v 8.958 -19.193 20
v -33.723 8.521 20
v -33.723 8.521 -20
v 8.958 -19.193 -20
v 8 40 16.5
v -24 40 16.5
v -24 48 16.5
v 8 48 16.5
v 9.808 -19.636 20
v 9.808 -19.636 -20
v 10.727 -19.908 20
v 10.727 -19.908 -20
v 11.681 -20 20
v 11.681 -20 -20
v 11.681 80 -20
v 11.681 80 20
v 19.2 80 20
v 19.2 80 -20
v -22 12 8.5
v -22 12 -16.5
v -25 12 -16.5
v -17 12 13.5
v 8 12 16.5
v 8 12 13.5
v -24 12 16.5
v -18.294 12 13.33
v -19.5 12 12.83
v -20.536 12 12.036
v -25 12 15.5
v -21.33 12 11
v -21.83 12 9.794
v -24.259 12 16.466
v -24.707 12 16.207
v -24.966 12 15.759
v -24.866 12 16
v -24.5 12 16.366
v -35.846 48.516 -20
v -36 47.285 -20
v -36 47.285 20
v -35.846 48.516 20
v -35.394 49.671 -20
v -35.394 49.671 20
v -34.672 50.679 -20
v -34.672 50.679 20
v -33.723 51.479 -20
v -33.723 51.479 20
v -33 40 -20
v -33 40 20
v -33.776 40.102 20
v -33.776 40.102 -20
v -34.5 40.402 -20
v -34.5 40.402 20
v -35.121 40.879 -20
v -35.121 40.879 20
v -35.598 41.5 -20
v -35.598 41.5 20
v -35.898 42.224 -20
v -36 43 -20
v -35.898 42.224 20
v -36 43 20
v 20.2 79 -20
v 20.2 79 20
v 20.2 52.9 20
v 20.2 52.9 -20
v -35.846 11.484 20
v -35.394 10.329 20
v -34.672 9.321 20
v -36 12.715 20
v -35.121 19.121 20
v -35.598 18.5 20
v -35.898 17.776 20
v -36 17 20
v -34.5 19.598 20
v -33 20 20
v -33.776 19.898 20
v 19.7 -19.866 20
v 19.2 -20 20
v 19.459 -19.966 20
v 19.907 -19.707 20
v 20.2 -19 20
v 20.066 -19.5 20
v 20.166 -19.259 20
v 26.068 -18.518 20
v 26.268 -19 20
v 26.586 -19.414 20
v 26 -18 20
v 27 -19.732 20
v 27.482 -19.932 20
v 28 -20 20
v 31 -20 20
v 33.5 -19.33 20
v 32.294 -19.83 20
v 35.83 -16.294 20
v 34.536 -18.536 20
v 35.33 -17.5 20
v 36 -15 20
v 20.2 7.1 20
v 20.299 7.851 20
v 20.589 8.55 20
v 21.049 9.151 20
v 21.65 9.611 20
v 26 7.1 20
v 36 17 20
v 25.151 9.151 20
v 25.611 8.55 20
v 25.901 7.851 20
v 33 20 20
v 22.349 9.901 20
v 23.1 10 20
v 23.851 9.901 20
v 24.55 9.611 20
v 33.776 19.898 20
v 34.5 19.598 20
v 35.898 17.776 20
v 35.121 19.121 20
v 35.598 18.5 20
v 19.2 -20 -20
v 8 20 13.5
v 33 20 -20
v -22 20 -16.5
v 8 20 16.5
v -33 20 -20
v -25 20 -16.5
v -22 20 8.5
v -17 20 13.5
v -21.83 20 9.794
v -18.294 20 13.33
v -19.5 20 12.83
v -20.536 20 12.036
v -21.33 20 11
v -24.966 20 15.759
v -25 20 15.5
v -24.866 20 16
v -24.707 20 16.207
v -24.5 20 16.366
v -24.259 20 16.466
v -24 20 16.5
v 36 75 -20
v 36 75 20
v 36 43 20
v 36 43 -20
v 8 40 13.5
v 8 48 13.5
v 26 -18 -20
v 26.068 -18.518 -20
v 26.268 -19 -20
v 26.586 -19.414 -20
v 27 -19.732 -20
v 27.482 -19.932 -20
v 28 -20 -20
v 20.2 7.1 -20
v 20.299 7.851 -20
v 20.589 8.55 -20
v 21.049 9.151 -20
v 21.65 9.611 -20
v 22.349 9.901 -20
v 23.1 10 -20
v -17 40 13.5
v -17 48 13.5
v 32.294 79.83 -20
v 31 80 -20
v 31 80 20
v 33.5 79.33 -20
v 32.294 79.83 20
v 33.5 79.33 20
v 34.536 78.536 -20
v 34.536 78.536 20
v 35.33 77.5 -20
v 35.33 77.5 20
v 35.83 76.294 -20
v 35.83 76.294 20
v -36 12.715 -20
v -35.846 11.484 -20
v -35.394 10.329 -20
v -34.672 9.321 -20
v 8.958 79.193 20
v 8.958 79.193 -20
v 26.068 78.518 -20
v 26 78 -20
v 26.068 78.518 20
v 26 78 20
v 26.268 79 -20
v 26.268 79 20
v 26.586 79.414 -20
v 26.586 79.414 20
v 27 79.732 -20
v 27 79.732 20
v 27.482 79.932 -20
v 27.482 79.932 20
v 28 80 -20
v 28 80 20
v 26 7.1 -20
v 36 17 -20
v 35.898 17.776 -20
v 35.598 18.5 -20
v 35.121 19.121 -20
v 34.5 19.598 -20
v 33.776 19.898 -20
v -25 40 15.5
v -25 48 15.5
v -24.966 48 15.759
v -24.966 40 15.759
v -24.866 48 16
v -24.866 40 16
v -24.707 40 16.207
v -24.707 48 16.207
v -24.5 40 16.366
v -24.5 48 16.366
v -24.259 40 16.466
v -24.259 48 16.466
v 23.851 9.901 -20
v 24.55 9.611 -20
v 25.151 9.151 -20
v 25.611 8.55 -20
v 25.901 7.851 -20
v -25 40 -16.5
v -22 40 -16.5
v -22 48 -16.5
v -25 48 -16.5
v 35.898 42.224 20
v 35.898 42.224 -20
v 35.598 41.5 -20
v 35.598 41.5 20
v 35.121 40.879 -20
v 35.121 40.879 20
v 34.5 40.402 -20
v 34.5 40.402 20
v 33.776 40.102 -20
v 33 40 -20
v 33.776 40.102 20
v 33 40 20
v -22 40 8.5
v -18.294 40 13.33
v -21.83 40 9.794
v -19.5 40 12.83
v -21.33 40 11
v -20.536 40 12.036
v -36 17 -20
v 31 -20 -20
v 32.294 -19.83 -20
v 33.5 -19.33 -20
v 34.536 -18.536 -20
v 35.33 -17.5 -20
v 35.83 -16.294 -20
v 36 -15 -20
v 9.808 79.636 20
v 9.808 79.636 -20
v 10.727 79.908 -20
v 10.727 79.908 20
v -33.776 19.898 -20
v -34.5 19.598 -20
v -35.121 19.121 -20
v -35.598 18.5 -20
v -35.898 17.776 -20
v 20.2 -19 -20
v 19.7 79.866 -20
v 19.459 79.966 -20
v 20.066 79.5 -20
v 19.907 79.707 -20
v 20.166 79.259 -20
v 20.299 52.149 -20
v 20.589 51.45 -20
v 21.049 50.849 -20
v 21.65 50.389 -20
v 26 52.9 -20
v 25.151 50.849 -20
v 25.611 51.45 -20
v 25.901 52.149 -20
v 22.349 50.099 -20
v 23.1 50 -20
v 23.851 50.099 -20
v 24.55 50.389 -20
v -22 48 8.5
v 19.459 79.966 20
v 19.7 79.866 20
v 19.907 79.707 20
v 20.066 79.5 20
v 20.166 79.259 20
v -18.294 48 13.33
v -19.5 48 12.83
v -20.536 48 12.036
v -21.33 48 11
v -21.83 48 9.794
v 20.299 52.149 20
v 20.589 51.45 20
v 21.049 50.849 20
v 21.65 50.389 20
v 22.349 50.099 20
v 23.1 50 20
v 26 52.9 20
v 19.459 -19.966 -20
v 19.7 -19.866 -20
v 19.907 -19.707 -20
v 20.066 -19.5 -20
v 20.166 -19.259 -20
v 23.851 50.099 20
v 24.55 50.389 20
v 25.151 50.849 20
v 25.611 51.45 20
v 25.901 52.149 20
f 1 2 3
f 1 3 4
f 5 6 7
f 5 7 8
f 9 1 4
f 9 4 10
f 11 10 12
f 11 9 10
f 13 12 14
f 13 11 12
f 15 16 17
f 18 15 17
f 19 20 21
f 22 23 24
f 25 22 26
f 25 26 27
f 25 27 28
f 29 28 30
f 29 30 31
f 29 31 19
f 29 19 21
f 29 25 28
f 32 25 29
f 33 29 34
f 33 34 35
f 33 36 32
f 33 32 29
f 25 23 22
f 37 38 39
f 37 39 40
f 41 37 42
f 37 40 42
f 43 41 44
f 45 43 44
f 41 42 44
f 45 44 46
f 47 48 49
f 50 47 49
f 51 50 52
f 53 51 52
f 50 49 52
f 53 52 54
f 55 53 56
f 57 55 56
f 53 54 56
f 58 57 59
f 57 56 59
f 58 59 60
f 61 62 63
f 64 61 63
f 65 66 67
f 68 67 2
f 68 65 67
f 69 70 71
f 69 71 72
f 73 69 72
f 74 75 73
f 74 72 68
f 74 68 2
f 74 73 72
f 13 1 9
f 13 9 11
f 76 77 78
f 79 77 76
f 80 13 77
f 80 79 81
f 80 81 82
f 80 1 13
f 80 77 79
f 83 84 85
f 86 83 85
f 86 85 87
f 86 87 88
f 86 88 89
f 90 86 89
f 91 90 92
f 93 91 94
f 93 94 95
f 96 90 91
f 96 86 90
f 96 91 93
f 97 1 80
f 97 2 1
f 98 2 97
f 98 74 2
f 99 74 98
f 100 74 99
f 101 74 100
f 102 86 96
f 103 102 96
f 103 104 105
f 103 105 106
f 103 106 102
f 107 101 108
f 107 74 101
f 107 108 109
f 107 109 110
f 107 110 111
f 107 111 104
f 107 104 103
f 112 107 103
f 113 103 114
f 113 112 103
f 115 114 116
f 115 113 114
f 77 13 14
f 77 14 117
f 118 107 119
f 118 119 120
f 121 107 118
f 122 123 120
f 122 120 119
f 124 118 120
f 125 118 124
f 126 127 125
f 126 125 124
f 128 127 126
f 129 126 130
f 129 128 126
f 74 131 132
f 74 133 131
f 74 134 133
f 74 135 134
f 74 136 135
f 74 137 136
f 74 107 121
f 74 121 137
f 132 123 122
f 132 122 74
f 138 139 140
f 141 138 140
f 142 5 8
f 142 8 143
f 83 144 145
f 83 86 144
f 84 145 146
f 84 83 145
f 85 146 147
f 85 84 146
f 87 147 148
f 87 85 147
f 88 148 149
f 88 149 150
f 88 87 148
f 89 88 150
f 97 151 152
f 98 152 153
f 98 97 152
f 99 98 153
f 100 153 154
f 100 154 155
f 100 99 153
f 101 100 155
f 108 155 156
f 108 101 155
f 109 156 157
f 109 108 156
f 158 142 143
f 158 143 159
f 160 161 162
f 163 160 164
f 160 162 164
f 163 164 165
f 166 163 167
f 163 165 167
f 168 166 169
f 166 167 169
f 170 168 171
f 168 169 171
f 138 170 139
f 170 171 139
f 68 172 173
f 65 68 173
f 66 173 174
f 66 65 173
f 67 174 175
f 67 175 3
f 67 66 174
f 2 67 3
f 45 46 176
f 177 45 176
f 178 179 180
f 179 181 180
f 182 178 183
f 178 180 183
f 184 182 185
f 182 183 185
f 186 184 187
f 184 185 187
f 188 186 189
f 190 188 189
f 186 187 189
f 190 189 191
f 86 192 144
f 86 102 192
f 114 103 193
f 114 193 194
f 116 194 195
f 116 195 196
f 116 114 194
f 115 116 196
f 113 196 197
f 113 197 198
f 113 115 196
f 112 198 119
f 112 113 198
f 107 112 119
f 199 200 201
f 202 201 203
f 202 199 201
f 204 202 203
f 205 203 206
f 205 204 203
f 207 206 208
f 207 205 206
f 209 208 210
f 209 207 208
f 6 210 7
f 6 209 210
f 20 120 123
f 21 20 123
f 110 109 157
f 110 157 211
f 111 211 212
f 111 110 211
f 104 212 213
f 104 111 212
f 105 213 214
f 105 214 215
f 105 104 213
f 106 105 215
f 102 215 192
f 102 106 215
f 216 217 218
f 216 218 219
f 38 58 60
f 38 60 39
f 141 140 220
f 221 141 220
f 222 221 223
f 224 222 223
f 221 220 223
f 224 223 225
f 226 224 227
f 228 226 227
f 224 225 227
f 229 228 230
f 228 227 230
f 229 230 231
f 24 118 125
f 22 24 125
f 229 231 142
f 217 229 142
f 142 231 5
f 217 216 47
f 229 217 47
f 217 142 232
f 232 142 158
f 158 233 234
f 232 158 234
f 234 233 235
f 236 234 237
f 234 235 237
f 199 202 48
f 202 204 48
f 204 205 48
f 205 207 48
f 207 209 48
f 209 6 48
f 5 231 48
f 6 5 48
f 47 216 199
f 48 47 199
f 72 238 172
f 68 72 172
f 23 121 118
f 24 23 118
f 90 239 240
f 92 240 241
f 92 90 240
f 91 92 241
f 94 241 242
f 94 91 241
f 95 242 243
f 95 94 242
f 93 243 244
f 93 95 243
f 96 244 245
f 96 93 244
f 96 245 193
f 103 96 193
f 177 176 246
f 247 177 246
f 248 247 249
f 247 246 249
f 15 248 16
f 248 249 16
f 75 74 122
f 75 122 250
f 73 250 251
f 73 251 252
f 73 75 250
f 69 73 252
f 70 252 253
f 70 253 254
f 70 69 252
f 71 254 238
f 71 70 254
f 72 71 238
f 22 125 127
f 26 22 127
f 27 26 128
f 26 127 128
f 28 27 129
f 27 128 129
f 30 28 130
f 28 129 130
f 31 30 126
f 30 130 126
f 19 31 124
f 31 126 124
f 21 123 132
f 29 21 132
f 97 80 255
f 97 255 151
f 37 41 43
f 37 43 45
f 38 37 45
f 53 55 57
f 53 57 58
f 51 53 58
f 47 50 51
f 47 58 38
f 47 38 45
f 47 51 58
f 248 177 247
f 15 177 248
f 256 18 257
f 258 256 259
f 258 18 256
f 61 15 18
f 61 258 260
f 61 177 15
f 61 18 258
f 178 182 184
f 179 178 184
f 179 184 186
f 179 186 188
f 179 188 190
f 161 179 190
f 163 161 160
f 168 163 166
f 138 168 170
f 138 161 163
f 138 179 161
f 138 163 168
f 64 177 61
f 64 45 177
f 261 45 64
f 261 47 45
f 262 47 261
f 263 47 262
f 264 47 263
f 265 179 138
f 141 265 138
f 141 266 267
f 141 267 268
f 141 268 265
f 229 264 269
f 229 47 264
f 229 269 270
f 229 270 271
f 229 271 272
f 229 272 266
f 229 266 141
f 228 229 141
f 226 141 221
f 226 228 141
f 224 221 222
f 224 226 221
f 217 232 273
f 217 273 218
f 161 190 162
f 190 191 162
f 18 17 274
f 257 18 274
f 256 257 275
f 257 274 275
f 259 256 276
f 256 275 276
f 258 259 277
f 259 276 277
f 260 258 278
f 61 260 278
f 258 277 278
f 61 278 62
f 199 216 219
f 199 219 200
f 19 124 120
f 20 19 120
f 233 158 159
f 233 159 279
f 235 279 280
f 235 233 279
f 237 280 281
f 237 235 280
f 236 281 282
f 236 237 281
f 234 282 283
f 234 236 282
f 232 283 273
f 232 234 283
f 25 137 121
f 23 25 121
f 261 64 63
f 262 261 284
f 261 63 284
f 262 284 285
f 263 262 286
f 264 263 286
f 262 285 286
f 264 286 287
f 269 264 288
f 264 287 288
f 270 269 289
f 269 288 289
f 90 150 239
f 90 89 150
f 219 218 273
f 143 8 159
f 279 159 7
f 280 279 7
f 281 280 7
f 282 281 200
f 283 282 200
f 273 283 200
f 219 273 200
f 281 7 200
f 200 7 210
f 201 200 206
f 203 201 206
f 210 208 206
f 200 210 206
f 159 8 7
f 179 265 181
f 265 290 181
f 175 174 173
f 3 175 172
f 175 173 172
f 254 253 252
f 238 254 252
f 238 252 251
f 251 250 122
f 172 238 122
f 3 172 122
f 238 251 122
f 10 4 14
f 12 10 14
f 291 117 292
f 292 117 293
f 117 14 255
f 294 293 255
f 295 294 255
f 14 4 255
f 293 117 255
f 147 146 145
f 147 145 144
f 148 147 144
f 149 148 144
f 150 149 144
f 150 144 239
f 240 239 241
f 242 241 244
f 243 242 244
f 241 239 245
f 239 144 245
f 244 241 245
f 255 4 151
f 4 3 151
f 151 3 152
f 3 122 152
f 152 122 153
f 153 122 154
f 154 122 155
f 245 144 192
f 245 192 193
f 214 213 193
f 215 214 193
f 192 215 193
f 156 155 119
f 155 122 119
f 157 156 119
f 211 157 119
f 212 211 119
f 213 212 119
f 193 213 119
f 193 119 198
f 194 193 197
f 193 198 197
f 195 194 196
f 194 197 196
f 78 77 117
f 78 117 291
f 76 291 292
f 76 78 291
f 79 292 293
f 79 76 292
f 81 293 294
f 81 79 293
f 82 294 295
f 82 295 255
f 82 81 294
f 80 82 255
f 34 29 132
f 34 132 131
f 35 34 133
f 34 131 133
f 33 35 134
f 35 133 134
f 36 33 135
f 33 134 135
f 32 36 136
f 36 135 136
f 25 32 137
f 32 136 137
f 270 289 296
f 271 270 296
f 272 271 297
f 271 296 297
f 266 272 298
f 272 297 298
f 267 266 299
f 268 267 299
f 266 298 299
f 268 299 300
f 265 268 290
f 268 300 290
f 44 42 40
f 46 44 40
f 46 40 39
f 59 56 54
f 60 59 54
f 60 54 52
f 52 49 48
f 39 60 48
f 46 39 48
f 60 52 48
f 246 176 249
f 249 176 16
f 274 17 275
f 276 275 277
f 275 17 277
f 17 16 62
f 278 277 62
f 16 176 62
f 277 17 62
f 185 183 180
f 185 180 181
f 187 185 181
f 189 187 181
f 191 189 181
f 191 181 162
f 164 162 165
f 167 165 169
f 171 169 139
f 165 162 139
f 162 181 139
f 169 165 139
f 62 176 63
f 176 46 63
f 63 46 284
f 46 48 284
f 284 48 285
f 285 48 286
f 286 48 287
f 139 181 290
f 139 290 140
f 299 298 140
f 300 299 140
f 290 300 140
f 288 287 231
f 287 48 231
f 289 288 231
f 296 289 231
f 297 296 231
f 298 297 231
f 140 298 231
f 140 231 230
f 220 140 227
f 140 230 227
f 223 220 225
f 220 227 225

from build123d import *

# Parameters (mm, degrees)
F1_DEPTH = 20
F3_DEPTH = 8


with BuildPart() as f1:
    # F0 (on Top) → F1 (new body, symmetric)
    with BuildSketch(Plane.XY):
        with BuildLine():
            Line((28, -20), (31, -20))
            ThreePointArc((31, -20), (34.535534, -18.535534), (36, -15))
            Line((36, -15), (36, 17))
            ThreePointArc((36, 17), (35.12132, 19.12132), (33, 20))
            Line((33, 20), (-33, 20))
            ThreePointArc((-33, 20), (-35.12132, 19.12132), (-36, 17))
            Line((-36, 17), (-36, 12.714908))
            ThreePointArc((-36, 12.714908), (-35.394038, 10.329026), (-33.723027, 8.521446))
            Line((-33.723027, 8.521446), (8.957931, -19.193462))
            ThreePointArc((8.957931, -19.193462), (10.260978, -19.794127), (11.680959, -20))
            Line((11.680959, -20), (19.2, -20))
            ThreePointArc((19.2, -20), (19.907107, -19.707107), (20.2, -19))
            Line((20.2, -19), (20.2, 7.1))
            ThreePointArc((20.2, 7.1), (21.04939, 9.15061), (23.1, 10))
            ThreePointArc((23.1, 10), (25.15061, 9.15061), (26, 7.1))
            Line((26, 7.1), (26, -18))
            ThreePointArc((26, -18), (26.585786, -19.414214), (28, -20))
        make_face()
    extrude(amount=F1_DEPTH, both=True)

    # F2 (on face) → F3 (cut)
    with BuildSketch(Plane(origin=(0, 20, 0), x_dir=(-1, 0, 0), z_dir=(0, 1, 0))):
        with BuildLine():
            Line((22, -16.5), (25, -16.5))
            Line((25, -16.5), (25, 15.5))
            ThreePointArc((25, 15.5), (24.707107, 16.207107), (24, 16.5))
            Line((24, 16.5), (-8, 16.5))
            Line((-8, 16.5), (-8, 13.5))
            Line((-8, 13.5), (17, 13.5))
            ThreePointArc((17, 13.5), (20.535534, 12.035534), (22, 8.5))
            Line((22, 8.5), (22, -16.5))
        make_face()
    extrude(amount=-F3_DEPTH, mode=Mode.SUBTRACT)


with BuildPart() as f5_1:
    # F5: instance of F1
    add(f1.part.mirror(Plane(origin=(1.252416, 30, -0.57769), x_dir=(-1, 0, 0), z_dir=(0, 1, 0))))


solid = Compound([f1.part, f5_1.part])
